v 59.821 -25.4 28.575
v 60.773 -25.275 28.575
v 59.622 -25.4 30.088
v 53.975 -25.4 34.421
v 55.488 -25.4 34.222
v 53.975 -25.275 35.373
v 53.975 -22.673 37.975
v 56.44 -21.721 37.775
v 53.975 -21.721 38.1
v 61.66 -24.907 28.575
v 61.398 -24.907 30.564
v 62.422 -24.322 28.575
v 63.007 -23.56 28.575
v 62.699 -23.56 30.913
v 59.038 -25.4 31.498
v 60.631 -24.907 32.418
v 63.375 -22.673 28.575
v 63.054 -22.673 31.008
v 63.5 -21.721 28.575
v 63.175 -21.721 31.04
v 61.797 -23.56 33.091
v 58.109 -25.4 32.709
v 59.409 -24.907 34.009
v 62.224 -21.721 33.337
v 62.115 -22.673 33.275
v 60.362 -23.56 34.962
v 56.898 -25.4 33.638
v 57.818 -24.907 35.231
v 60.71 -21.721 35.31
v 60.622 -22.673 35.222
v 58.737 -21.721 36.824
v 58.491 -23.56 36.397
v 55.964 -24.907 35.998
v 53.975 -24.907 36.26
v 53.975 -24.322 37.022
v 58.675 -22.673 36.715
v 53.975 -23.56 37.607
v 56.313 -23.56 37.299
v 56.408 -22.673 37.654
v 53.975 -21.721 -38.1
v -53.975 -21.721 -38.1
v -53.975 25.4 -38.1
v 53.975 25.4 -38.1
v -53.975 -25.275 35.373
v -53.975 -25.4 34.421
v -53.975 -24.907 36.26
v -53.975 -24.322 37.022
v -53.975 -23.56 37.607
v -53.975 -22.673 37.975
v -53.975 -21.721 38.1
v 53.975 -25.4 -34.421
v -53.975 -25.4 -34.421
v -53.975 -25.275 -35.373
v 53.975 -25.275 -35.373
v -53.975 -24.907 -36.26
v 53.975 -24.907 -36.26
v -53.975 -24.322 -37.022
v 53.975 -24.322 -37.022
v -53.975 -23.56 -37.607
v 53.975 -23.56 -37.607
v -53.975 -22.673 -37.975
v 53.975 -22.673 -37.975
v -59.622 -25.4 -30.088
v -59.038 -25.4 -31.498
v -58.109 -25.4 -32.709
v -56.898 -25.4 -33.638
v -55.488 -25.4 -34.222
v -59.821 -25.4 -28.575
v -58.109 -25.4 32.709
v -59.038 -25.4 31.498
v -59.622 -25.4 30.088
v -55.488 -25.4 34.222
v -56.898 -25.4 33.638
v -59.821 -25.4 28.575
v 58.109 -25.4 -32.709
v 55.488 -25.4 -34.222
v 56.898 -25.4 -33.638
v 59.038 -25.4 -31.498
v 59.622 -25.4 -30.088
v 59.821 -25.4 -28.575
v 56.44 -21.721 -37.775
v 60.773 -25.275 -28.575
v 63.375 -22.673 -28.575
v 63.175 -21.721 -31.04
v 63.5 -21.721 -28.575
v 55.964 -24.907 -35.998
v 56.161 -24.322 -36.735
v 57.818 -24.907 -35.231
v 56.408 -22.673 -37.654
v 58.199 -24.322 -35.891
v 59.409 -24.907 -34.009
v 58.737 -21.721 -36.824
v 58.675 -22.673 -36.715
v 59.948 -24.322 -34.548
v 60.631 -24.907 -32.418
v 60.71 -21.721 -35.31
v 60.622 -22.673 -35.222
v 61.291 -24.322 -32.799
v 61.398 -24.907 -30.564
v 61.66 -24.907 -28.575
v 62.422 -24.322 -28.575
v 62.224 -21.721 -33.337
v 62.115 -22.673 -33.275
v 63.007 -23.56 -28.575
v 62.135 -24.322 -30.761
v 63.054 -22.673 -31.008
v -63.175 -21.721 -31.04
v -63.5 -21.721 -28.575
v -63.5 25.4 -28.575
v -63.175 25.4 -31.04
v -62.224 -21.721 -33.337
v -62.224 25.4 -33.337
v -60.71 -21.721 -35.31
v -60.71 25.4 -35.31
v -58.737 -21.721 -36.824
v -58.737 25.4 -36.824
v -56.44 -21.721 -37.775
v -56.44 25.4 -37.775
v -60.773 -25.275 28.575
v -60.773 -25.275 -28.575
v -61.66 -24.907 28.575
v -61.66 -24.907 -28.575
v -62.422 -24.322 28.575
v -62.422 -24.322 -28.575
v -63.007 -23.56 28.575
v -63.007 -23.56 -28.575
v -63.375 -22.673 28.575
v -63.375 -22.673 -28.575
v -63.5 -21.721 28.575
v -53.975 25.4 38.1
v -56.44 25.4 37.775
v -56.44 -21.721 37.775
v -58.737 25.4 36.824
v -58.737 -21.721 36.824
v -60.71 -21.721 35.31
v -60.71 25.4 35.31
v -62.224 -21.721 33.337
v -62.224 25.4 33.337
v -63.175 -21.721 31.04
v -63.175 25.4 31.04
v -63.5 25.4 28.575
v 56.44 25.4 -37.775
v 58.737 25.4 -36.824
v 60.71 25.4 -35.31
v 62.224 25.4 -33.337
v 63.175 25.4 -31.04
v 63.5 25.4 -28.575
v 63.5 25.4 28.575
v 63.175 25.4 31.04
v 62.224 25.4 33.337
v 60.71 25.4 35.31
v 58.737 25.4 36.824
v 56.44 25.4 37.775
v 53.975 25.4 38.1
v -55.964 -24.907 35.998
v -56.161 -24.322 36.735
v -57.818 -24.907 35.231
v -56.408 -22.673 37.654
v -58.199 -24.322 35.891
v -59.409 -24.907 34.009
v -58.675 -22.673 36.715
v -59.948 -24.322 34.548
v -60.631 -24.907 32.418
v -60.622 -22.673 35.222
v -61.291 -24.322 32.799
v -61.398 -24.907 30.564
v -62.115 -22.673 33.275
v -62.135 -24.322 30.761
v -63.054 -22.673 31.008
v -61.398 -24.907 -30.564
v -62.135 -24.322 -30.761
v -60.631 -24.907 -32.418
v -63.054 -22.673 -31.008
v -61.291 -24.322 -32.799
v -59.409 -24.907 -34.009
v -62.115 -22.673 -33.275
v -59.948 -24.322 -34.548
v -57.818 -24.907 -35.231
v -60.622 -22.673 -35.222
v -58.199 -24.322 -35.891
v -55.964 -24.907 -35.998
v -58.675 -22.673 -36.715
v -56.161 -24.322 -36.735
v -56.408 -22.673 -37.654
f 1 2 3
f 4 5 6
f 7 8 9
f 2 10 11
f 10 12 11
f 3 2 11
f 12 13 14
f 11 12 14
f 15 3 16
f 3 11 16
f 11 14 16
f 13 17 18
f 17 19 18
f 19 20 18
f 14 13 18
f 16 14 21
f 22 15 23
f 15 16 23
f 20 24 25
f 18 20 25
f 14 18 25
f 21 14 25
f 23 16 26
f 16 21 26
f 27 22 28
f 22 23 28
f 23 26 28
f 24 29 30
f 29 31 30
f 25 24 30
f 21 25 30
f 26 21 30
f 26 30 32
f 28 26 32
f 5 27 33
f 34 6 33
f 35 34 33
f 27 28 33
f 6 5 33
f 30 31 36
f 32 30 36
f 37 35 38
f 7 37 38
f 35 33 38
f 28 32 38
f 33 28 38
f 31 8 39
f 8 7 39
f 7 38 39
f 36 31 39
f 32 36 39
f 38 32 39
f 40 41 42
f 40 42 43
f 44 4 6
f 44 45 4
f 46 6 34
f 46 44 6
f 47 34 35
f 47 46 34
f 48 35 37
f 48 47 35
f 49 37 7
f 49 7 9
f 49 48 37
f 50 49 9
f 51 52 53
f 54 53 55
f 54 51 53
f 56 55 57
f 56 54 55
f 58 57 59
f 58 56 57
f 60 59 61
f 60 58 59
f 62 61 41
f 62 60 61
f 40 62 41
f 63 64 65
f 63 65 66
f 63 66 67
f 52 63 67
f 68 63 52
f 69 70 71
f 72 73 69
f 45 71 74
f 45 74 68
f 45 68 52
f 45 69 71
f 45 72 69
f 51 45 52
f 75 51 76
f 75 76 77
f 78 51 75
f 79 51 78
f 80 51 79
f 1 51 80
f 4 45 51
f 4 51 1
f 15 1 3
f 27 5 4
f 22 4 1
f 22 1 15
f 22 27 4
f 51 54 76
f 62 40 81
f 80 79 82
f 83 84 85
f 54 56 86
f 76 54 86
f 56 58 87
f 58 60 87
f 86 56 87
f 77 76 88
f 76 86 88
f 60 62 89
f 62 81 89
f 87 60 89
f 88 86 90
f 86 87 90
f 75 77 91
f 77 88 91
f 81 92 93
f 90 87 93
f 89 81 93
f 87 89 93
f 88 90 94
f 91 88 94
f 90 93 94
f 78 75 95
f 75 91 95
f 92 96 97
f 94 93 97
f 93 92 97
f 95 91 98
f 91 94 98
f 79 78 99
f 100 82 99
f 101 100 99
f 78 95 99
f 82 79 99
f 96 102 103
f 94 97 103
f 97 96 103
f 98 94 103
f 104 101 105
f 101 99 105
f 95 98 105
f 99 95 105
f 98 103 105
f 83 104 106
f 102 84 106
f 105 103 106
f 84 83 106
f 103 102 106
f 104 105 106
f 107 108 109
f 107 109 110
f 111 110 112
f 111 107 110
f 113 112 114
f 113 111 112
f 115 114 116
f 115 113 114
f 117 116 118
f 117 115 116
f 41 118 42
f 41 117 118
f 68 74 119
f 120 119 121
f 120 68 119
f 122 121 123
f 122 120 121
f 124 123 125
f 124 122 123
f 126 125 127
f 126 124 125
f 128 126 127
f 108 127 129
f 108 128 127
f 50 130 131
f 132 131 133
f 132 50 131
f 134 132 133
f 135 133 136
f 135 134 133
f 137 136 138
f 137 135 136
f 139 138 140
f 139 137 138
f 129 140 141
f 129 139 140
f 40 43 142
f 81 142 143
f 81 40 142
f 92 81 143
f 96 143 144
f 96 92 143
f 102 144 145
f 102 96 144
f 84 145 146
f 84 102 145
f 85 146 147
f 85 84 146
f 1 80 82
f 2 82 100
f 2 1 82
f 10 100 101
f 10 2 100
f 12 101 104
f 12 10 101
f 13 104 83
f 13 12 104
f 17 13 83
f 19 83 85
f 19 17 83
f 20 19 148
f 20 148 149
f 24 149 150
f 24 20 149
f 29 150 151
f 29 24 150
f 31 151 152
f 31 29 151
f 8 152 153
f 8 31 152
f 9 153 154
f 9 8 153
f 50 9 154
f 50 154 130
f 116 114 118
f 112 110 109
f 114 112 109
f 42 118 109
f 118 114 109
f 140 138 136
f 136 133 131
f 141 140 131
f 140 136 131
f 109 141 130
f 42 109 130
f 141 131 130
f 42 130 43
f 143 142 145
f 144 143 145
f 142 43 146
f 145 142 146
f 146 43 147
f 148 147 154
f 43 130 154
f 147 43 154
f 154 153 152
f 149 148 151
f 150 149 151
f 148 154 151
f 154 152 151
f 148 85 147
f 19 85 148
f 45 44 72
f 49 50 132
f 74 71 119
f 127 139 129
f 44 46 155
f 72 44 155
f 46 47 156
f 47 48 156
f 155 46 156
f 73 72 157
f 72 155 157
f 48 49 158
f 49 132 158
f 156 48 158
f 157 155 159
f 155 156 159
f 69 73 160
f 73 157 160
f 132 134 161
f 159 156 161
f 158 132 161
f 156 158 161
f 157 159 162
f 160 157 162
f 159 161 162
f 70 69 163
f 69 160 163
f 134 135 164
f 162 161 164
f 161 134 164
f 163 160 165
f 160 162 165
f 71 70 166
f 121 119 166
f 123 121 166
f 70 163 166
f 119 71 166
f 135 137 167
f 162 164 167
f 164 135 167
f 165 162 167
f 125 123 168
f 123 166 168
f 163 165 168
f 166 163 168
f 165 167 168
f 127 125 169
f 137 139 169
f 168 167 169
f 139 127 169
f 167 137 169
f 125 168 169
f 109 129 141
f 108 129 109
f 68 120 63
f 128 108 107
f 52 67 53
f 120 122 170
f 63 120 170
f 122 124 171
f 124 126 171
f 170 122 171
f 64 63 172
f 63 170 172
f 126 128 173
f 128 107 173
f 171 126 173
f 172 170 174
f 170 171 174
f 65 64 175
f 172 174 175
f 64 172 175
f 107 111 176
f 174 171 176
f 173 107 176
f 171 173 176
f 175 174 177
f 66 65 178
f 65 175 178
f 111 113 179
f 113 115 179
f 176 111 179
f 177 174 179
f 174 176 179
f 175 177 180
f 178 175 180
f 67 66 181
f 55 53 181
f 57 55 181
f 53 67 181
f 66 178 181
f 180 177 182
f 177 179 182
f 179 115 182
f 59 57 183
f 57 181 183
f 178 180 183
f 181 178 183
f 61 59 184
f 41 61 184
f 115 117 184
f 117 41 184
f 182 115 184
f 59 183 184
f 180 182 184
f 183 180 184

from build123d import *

# Parameters (mm, degrees)
F1_DEPTH = 25.4
F2_R     = 3.6792614691


with BuildPart() as f1:
    # F0 (on Front) → F1 (new body, symmetric)
    with BuildSketch(Plane.XZ):
        with BuildLine():
            ThreePointArc((63.5, 28.575), (60.7101920908, 35.3101920908), (53.975, 38.1))
            Line((53.975, 38.1), (-53.975, 38.1))
            ThreePointArc((-53.975, 38.1), (-60.7101920908, 35.3101920908), (-63.5, 28.575))
            Line((-63.5, 28.575), (-63.5, -28.575))
            ThreePointArc((-63.5, -28.575), (-60.7101920908, -35.3101920908), (-53.975, -38.1))
            Line((-53.975, -38.1), (53.975, -38.1))
            ThreePointArc((53.975, -38.1), (60.7101920908, -35.3101920908), (63.5, -28.575))
            Line((63.5, -28.575), (63.5, 28.575))
        make_face()
    extrude(amount=F1_DEPTH, both=True)

    # F2
    f2_edges = [f1.edges().sort_by_distance(p)[0] for p in [
        (0, -25.4, 38.1),
    ]]
    fillet(f2_edges, radius=F2_R)


solid = f1.part
